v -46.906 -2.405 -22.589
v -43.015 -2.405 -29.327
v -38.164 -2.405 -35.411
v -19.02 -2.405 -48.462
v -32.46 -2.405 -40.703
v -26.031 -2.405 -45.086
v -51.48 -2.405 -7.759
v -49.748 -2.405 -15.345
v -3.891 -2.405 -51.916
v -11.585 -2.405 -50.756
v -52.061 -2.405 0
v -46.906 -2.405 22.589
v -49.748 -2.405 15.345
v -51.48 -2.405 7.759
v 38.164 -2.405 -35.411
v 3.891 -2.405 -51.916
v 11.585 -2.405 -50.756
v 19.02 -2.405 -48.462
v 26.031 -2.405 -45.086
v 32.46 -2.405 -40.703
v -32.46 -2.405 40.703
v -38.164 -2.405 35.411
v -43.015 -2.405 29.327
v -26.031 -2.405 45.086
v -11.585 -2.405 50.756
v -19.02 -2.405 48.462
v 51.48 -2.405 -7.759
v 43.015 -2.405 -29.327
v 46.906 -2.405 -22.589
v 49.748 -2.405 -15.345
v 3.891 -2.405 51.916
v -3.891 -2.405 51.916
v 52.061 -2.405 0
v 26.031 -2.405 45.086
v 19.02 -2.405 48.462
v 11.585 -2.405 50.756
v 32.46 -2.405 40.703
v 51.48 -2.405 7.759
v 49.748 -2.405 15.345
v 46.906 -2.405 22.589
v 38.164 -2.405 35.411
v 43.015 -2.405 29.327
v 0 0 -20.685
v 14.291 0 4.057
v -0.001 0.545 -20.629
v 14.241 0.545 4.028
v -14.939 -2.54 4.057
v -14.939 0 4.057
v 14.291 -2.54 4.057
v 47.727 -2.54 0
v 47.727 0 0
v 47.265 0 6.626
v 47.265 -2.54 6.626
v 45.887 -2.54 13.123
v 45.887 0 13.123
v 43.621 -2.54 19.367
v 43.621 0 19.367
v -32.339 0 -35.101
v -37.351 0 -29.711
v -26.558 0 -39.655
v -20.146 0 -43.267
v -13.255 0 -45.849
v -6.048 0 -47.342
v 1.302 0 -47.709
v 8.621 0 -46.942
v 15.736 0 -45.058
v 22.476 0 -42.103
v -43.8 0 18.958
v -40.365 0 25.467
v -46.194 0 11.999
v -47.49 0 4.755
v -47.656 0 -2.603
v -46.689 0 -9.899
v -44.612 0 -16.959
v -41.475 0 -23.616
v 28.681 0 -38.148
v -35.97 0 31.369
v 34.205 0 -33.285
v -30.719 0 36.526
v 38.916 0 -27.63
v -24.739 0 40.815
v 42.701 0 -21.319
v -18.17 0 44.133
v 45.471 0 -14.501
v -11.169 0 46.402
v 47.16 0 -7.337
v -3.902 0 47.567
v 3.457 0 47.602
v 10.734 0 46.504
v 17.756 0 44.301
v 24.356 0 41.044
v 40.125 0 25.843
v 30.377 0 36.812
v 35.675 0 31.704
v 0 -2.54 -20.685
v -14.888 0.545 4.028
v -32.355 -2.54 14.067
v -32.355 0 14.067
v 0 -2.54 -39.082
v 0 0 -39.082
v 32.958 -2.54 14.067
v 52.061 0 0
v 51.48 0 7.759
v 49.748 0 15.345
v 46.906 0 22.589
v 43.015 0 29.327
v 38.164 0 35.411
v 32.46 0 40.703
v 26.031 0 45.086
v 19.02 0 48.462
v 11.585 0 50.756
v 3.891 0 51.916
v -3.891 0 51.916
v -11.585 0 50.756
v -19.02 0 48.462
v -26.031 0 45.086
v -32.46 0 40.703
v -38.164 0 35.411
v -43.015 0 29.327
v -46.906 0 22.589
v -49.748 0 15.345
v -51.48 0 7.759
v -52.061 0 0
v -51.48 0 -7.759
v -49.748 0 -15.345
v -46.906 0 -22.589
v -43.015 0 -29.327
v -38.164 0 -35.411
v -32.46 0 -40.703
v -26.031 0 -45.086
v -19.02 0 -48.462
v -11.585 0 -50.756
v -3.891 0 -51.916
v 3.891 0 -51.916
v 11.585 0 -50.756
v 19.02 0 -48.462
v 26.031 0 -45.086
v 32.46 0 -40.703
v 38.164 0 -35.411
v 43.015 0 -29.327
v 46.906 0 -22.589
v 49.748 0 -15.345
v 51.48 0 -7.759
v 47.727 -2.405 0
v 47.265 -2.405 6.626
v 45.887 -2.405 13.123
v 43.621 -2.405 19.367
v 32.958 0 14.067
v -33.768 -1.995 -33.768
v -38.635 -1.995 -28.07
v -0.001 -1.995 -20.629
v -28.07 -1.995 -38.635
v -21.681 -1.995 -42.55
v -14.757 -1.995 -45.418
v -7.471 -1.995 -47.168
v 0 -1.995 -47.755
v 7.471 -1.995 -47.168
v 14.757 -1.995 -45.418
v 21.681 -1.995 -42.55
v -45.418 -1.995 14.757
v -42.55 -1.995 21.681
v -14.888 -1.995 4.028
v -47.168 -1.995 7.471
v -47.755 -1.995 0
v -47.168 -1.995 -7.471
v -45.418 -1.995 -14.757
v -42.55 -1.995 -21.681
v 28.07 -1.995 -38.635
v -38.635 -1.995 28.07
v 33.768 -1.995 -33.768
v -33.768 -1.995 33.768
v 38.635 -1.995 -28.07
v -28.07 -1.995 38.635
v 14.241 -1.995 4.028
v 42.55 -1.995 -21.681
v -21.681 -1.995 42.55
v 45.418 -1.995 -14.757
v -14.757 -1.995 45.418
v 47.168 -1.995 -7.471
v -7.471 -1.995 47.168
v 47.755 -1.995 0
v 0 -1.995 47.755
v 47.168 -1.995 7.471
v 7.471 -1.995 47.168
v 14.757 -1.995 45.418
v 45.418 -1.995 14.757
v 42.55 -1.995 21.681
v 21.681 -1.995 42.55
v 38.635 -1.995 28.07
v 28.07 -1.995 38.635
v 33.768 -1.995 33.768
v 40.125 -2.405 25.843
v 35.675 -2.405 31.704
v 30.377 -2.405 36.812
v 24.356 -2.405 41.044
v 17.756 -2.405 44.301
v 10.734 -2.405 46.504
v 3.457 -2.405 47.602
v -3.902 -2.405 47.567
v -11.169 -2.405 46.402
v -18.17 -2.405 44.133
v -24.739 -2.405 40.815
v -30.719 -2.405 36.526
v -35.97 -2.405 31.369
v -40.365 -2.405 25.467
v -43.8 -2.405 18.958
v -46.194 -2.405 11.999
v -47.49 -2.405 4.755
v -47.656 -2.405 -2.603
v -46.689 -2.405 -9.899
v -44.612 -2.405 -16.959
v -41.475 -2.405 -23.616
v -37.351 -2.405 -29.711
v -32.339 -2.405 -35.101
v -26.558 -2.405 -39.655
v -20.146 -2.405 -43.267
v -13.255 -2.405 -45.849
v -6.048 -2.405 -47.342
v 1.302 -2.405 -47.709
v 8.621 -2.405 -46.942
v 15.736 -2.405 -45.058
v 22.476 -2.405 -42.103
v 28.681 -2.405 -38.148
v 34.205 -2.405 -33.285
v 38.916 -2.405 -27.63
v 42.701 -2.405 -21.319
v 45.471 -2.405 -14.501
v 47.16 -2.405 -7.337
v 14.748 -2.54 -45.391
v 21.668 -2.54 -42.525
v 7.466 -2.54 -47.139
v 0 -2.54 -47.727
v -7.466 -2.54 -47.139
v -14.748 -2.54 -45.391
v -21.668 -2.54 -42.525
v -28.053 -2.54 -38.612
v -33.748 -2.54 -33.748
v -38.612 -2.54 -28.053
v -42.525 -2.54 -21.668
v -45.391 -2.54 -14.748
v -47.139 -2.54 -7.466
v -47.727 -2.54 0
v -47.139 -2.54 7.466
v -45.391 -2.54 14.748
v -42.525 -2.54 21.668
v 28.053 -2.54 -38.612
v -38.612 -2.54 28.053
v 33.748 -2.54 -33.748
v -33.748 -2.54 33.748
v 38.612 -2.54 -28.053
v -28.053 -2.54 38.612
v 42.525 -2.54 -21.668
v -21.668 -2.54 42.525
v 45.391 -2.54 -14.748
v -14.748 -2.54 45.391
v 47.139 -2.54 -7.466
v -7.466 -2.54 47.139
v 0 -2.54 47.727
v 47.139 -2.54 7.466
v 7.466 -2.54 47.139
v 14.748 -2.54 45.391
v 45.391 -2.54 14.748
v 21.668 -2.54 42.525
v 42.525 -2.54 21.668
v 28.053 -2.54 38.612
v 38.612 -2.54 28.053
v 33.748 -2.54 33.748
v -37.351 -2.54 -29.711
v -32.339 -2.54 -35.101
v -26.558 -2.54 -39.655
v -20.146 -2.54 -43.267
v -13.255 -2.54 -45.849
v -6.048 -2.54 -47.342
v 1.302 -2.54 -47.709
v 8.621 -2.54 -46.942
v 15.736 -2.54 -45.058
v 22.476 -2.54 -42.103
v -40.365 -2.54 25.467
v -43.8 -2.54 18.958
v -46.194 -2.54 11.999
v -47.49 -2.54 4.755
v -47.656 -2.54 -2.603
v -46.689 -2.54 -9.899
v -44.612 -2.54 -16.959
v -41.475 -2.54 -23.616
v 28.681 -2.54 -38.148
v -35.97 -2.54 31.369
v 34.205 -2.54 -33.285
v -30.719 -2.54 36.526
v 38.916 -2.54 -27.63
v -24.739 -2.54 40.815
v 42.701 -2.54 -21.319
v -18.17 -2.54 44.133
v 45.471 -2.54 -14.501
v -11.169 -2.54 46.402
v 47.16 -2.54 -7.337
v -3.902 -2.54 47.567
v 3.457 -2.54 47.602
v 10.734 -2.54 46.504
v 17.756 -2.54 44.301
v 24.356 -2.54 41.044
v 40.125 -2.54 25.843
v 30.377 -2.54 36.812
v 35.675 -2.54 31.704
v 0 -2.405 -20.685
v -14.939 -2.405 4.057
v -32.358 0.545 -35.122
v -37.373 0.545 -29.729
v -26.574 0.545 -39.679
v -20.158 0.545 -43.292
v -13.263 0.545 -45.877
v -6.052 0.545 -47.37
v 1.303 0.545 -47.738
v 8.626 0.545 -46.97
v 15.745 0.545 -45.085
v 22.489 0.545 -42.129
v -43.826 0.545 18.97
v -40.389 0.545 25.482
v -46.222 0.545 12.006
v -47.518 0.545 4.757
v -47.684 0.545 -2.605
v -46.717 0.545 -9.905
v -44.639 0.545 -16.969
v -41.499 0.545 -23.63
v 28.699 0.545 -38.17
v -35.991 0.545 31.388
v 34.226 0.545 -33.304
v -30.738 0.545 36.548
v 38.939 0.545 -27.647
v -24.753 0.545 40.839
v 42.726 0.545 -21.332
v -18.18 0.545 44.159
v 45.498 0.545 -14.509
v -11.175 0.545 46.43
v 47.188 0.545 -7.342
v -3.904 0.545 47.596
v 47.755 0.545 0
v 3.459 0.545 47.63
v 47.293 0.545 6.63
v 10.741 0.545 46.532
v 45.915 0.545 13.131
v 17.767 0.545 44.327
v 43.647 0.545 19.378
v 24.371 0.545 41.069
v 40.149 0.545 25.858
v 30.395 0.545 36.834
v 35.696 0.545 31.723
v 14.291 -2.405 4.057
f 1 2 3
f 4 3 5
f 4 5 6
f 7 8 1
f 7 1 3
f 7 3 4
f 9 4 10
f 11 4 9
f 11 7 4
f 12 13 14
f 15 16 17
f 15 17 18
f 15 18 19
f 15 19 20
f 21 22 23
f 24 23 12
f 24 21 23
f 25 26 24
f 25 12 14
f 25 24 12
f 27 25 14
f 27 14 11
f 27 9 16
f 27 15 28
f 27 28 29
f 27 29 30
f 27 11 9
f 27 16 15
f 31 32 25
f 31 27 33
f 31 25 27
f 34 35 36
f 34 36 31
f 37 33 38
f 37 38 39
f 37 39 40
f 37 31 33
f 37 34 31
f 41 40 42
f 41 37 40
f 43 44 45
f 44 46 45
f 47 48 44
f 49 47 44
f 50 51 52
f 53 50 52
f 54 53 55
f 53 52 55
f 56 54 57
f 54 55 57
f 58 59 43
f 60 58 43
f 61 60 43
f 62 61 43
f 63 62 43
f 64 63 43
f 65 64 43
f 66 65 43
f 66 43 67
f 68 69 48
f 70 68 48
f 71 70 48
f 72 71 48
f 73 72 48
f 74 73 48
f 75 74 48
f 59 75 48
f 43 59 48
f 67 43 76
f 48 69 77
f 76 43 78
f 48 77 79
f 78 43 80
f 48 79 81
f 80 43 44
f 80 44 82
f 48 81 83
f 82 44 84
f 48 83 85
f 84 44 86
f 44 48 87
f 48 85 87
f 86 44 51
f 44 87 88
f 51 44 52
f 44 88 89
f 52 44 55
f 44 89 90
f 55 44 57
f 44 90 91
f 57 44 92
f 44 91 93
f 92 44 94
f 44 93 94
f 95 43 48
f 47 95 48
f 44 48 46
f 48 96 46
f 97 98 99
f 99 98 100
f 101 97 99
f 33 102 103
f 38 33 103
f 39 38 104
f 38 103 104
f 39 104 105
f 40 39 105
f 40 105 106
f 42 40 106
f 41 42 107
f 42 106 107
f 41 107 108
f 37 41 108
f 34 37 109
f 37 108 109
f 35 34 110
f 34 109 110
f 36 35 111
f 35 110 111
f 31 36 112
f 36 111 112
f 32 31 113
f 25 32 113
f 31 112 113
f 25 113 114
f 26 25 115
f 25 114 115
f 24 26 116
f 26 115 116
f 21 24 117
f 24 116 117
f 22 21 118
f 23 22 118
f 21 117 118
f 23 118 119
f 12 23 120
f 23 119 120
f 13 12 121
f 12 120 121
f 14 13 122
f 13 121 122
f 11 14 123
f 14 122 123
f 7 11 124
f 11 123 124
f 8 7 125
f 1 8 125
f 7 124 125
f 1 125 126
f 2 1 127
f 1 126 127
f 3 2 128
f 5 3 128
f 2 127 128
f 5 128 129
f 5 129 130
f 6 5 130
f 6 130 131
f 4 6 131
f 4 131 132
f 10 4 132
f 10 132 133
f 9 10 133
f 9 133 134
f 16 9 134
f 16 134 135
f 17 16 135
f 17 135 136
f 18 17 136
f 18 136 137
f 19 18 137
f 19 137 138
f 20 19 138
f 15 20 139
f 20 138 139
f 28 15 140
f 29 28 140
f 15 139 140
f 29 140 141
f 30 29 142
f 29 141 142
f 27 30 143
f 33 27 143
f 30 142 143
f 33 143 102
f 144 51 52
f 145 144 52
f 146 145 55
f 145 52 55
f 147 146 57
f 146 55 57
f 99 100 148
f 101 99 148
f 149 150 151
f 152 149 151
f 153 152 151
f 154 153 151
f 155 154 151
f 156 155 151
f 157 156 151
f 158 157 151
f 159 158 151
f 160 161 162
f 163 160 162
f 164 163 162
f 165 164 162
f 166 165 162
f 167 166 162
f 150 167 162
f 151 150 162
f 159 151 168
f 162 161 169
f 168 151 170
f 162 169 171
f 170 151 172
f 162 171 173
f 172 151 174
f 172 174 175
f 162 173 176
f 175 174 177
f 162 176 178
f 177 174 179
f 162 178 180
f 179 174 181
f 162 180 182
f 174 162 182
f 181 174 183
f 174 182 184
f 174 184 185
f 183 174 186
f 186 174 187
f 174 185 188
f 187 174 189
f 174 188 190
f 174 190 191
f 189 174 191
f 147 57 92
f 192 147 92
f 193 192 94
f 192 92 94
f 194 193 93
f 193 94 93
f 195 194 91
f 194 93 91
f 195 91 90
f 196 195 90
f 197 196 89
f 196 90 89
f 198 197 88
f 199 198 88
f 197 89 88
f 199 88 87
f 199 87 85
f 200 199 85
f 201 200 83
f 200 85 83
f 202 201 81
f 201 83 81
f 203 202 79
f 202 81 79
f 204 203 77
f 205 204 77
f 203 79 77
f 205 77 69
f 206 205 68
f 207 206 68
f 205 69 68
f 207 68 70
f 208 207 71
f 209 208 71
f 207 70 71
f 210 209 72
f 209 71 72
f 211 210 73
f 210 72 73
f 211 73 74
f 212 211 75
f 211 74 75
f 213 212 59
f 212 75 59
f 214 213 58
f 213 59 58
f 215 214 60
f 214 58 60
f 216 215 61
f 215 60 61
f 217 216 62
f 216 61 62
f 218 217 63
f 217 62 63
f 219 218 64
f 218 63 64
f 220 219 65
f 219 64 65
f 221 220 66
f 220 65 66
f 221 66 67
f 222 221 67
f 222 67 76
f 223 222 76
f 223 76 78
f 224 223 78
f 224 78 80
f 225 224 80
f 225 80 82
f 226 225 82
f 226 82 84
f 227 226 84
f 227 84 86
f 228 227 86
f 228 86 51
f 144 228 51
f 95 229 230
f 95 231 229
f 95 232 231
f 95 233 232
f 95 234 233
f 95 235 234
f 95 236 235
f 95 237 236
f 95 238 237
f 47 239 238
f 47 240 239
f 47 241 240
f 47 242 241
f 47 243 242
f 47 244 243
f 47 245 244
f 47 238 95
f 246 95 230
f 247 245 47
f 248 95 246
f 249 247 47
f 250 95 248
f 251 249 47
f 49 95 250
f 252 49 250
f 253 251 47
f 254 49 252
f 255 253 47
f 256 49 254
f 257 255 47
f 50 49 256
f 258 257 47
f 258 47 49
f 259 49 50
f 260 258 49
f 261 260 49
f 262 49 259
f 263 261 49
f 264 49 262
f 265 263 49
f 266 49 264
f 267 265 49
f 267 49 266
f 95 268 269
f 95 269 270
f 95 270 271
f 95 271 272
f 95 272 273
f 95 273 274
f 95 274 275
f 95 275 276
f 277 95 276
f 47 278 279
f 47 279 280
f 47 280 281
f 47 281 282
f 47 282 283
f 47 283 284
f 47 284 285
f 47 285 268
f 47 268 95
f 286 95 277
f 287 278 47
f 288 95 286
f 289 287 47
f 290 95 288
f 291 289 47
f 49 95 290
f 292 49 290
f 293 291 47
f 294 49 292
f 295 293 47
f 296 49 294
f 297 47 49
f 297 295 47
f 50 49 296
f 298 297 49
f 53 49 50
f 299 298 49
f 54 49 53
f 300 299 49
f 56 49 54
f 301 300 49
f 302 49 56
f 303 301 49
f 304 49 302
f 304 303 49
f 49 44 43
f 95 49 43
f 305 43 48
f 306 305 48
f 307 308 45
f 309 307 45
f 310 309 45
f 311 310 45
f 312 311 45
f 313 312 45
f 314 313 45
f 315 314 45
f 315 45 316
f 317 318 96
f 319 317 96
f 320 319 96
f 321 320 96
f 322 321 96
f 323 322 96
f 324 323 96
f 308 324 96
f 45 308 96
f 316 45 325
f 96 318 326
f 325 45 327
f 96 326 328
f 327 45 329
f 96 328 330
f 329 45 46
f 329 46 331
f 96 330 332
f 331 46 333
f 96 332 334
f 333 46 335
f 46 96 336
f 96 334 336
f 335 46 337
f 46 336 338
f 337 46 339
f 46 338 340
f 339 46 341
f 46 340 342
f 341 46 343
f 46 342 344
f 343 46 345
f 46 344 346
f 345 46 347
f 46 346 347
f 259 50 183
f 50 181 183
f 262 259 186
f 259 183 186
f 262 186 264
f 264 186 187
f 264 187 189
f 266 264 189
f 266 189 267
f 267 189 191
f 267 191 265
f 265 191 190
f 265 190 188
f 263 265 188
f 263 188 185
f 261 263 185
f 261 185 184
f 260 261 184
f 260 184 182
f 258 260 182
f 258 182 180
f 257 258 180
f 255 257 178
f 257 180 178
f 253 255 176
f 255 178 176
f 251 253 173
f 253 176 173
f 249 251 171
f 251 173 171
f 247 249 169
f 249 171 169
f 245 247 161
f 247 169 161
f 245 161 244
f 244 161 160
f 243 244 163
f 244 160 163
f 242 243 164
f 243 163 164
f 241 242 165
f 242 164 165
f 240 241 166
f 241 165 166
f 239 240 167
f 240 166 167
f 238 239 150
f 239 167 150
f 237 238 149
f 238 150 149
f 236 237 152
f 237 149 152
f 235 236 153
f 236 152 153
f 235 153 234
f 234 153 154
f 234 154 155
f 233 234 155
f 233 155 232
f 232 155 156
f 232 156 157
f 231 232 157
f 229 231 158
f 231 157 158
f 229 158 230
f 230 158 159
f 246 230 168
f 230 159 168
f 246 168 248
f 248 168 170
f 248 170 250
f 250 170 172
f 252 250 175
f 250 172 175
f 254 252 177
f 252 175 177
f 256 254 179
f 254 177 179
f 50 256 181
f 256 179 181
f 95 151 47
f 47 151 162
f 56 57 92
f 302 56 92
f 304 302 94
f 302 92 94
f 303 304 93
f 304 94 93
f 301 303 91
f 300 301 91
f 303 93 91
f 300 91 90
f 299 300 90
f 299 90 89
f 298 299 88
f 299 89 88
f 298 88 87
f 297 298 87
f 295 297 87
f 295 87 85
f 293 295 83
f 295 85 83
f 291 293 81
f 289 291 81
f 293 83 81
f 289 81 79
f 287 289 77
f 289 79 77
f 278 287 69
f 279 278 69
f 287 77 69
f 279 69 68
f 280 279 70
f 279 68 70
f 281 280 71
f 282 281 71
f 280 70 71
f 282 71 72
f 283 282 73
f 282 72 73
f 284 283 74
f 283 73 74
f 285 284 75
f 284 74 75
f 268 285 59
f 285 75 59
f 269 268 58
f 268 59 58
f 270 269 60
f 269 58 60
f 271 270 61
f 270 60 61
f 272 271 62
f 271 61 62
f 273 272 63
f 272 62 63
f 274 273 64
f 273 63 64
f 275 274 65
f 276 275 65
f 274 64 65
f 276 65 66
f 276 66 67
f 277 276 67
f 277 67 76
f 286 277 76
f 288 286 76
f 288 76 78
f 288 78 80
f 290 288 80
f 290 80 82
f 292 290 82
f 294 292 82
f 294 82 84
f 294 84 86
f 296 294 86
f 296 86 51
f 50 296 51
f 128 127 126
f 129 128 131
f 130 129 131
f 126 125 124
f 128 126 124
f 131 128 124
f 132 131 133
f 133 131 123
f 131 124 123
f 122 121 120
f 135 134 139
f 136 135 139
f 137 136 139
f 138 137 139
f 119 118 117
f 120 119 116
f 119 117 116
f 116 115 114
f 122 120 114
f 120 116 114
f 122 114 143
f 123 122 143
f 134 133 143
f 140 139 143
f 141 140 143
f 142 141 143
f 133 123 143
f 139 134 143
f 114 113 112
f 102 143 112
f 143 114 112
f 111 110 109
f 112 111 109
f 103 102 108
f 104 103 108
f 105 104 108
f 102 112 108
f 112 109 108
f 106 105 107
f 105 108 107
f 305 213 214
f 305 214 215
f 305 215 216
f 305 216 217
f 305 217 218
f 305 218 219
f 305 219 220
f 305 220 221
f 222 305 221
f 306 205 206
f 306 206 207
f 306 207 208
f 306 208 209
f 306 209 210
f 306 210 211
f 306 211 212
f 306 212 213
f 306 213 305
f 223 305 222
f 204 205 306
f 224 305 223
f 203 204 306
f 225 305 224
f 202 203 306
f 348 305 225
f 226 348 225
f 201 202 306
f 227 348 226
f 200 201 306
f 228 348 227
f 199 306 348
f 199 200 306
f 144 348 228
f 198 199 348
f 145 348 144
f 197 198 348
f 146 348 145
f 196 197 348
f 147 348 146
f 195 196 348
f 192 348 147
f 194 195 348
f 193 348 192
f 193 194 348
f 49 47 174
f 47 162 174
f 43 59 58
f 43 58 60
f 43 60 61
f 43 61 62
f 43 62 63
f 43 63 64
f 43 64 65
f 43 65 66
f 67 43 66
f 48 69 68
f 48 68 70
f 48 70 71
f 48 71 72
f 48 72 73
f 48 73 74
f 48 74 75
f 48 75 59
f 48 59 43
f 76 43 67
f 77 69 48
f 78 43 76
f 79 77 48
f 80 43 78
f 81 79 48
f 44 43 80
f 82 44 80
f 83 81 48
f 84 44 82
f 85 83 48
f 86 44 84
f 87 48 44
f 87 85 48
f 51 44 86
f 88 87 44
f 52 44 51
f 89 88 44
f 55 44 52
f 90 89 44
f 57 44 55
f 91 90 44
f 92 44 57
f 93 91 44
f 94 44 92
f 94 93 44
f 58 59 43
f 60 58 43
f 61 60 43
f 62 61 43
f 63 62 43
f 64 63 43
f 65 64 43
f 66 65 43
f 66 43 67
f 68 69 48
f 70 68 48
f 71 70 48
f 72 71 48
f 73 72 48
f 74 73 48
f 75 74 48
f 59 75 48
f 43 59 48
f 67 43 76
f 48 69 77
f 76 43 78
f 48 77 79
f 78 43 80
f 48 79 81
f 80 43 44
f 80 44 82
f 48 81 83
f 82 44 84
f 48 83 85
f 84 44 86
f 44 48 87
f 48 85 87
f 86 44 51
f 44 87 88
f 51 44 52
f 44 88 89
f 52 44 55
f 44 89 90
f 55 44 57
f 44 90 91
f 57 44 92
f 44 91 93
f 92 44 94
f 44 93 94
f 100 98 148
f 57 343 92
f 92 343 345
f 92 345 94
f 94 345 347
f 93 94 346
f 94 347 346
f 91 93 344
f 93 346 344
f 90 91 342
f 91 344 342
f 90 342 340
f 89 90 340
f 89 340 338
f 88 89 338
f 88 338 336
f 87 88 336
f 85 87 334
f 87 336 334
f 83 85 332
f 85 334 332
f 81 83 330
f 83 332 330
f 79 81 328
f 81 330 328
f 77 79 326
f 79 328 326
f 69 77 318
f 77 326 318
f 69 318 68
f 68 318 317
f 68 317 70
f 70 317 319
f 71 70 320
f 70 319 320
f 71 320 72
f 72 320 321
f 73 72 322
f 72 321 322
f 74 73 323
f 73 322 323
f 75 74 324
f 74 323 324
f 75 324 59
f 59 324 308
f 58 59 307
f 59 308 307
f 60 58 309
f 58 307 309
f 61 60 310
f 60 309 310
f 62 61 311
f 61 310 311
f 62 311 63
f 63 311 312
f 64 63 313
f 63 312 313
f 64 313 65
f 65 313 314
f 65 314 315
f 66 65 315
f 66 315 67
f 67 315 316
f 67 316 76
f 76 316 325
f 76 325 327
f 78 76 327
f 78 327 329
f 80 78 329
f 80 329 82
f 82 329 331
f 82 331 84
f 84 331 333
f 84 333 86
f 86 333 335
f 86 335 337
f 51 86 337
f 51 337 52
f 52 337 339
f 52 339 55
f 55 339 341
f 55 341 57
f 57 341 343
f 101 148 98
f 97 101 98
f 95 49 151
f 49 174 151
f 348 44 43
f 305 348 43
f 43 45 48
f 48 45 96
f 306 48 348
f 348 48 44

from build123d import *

# Parameters (mm, degrees)
F3_DEPTH  = 2.54
F1_R      = 52.0612504087
F4_DEPTH  = 2.4054199457
F3_FACE_R = 47.7269460656
F5_DEPTH  = 0.5445368588
F5_TAPER  = -3


with BuildPart() as f3:
    # F0 (on Front) → F3 (new body)
    with BuildSketch(Plane.XZ):
        Polygon((14.2906159163, 4.056841135), (43.6209606961, 19.3668058466), (-43.6209606961, 19.3668058466), (-14.9385407567, 4.056841135), align=None)
        with BuildLine():
            ThreePointArc((0, -47.7269460656), (33.7480472083, -33.7480472083), (47.7269460656, 0))
            ThreePointArc((47.7269460656, 0), (46.6891669406, 9.8986398631), (43.6209606961, 19.3668058466))
            Line((43.6209606961, 19.3668058466), (0, -47.7269460656))
        make_face()
        with BuildLine():
            Line((-43.6209606961, 19.3668058466), (43.6209606961, 19.3668058466))
            ThreePointArc((43.6209606961, 19.3668058466), (0, 47.7269460656), (-43.6209606961, 19.3668058466))
        make_face()
        Polygon((0, -47.7269460656), (43.6209606961, 19.3668058466), (14.2906159163, 4.056841135), (0, -20.6848606467), align=None)
        with BuildLine():
            ThreePointArc((-43.6209606961, 19.3668058466), (-40.0136219234, -26.01483118), (0, -47.7269460656))
            Line((0, -47.7269460656), (-43.6209606961, 19.3668058466))
        make_face()
        Polygon((-43.6209606961, 19.3668058466), (0, -47.7269460656), (0, -20.6848606467), (-14.9385407567, 4.056841135), align=None)
    extrude(amount=F3_DEPTH)


with BuildPart() as f3b:
    # F2 (on Front) → F3, piece 2 (new body)
    with BuildSketch(Plane.XZ):
        Polygon((-32.3546789587, 14.0674561262), (0, -39.0817448497), (32.9583846033, 14.0674561262), align=None)
    extrude(amount=F3_DEPTH)


with BuildPart() as f4:
    # F1 (on Front) → F4 (new body)
    with BuildSketch(Plane.XZ):
        Circle(F1_R)
    extrude(amount=F4_DEPTH)


with BuildPart() as f4b:
    # F0 (on Front) → F4, piece 2 (new body)
    with BuildSketch(Plane.XZ):
        with BuildLine():
            ThreePointArc((0, -47.7269460656), (33.7480472083, -33.7480472083), (47.7269460656, 0))
            ThreePointArc((47.7269460656, 0), (46.6891669406, 9.8986398631), (43.6209606961, 19.3668058466))
            Line((43.6209606961, 19.3668058466), (0, -47.7269460656))
        make_face()
        with BuildLine():
            Line((-43.6209606961, 19.3668058466), (43.6209606961, 19.3668058466))
            ThreePointArc((43.6209606961, 19.3668058466), (0, 47.7269460656), (-43.6209606961, 19.3668058466))
        make_face()
        Polygon((14.2906159163, 4.056841135), (43.6209606961, 19.3668058466), (-43.6209606961, 19.3668058466), (-14.9385407567, 4.056841135), align=None)
        Polygon((0, -47.7269460656), (43.6209606961, 19.3668058466), (14.2906159163, 4.056841135), (0, -20.6848606467), align=None)
        with BuildLine():
            ThreePointArc((-43.6209606961, 19.3668058466), (-40.0136219234, -26.01483118), (0, -47.7269460656))
            Line((0, -47.7269460656), (-43.6209606961, 19.3668058466))
        make_face()
        Polygon((-43.6209606961, 19.3668058466), (0, -47.7269460656), (0, -20.6848606467), (-14.9385407567, 4.056841135), align=None)
    extrude(amount=F4_DEPTH)


with BuildPart() as f5:
    # F0 (on Front) + F3_face (on face) → F5 (new body)
    with BuildSketch(Plane.XZ):
        with BuildLine():
            ThreePointArc((0, -47.7269460656), (33.7480472083, -33.7480472083), (47.7269460656, 0))
            ThreePointArc((47.7269460656, 0), (46.6891669406, 9.8986398631), (43.6209606961, 19.3668058466))
            Line((43.6209606961, 19.3668058466), (0, -47.7269460656))
        make_face()
        with BuildLine():
            Line((-43.6209606961, 19.3668058466), (43.6209606961, 19.3668058466))
            ThreePointArc((43.6209606961, 19.3668058466), (0, 47.7269460656), (-43.6209606961, 19.3668058466))
        make_face()
        Polygon((14.2906159163, 4.056841135), (43.6209606961, 19.3668058466), (-43.6209606961, 19.3668058466), (-14.9385407567, 4.056841135), align=None)
        Polygon((0, -47.7269460656), (43.6209606961, 19.3668058466), (14.2906159163, 4.056841135), (0, -20.6848606467), align=None)
        with BuildLine():
            ThreePointArc((-43.6209606961, 19.3668058466), (-40.0136219234, -26.01483118), (0, -47.7269460656))
            Line((0, -47.7269460656), (-43.6209606961, 19.3668058466))
        make_face()
        Polygon((-43.6209606961, 19.3668058466), (0, -47.7269460656), (0, -20.6848606467), (-14.9385407567, 4.056841135), align=None)
    with BuildSketch(Plane(origin=(0.0114937106, -2.54, 0.2230034674), x_dir=(1, 0, 0), z_dir=(0, -1, 0))):
        with Locations((-0.0114937106, -0.2230034674)):
            Circle(F3_FACE_R)
        Polygon((-14.9500344673, 3.8338376676), (14.2791222057, 3.8338376676), (-0.0114937106, -20.9078641141), align=None, mode=Mode.SUBTRACT)
    extrude(amount=-F5_DEPTH, taper=F5_TAPER)


solid = Compound([f3.part, f3b.part, f4.part, f4b.part, f5.part])
